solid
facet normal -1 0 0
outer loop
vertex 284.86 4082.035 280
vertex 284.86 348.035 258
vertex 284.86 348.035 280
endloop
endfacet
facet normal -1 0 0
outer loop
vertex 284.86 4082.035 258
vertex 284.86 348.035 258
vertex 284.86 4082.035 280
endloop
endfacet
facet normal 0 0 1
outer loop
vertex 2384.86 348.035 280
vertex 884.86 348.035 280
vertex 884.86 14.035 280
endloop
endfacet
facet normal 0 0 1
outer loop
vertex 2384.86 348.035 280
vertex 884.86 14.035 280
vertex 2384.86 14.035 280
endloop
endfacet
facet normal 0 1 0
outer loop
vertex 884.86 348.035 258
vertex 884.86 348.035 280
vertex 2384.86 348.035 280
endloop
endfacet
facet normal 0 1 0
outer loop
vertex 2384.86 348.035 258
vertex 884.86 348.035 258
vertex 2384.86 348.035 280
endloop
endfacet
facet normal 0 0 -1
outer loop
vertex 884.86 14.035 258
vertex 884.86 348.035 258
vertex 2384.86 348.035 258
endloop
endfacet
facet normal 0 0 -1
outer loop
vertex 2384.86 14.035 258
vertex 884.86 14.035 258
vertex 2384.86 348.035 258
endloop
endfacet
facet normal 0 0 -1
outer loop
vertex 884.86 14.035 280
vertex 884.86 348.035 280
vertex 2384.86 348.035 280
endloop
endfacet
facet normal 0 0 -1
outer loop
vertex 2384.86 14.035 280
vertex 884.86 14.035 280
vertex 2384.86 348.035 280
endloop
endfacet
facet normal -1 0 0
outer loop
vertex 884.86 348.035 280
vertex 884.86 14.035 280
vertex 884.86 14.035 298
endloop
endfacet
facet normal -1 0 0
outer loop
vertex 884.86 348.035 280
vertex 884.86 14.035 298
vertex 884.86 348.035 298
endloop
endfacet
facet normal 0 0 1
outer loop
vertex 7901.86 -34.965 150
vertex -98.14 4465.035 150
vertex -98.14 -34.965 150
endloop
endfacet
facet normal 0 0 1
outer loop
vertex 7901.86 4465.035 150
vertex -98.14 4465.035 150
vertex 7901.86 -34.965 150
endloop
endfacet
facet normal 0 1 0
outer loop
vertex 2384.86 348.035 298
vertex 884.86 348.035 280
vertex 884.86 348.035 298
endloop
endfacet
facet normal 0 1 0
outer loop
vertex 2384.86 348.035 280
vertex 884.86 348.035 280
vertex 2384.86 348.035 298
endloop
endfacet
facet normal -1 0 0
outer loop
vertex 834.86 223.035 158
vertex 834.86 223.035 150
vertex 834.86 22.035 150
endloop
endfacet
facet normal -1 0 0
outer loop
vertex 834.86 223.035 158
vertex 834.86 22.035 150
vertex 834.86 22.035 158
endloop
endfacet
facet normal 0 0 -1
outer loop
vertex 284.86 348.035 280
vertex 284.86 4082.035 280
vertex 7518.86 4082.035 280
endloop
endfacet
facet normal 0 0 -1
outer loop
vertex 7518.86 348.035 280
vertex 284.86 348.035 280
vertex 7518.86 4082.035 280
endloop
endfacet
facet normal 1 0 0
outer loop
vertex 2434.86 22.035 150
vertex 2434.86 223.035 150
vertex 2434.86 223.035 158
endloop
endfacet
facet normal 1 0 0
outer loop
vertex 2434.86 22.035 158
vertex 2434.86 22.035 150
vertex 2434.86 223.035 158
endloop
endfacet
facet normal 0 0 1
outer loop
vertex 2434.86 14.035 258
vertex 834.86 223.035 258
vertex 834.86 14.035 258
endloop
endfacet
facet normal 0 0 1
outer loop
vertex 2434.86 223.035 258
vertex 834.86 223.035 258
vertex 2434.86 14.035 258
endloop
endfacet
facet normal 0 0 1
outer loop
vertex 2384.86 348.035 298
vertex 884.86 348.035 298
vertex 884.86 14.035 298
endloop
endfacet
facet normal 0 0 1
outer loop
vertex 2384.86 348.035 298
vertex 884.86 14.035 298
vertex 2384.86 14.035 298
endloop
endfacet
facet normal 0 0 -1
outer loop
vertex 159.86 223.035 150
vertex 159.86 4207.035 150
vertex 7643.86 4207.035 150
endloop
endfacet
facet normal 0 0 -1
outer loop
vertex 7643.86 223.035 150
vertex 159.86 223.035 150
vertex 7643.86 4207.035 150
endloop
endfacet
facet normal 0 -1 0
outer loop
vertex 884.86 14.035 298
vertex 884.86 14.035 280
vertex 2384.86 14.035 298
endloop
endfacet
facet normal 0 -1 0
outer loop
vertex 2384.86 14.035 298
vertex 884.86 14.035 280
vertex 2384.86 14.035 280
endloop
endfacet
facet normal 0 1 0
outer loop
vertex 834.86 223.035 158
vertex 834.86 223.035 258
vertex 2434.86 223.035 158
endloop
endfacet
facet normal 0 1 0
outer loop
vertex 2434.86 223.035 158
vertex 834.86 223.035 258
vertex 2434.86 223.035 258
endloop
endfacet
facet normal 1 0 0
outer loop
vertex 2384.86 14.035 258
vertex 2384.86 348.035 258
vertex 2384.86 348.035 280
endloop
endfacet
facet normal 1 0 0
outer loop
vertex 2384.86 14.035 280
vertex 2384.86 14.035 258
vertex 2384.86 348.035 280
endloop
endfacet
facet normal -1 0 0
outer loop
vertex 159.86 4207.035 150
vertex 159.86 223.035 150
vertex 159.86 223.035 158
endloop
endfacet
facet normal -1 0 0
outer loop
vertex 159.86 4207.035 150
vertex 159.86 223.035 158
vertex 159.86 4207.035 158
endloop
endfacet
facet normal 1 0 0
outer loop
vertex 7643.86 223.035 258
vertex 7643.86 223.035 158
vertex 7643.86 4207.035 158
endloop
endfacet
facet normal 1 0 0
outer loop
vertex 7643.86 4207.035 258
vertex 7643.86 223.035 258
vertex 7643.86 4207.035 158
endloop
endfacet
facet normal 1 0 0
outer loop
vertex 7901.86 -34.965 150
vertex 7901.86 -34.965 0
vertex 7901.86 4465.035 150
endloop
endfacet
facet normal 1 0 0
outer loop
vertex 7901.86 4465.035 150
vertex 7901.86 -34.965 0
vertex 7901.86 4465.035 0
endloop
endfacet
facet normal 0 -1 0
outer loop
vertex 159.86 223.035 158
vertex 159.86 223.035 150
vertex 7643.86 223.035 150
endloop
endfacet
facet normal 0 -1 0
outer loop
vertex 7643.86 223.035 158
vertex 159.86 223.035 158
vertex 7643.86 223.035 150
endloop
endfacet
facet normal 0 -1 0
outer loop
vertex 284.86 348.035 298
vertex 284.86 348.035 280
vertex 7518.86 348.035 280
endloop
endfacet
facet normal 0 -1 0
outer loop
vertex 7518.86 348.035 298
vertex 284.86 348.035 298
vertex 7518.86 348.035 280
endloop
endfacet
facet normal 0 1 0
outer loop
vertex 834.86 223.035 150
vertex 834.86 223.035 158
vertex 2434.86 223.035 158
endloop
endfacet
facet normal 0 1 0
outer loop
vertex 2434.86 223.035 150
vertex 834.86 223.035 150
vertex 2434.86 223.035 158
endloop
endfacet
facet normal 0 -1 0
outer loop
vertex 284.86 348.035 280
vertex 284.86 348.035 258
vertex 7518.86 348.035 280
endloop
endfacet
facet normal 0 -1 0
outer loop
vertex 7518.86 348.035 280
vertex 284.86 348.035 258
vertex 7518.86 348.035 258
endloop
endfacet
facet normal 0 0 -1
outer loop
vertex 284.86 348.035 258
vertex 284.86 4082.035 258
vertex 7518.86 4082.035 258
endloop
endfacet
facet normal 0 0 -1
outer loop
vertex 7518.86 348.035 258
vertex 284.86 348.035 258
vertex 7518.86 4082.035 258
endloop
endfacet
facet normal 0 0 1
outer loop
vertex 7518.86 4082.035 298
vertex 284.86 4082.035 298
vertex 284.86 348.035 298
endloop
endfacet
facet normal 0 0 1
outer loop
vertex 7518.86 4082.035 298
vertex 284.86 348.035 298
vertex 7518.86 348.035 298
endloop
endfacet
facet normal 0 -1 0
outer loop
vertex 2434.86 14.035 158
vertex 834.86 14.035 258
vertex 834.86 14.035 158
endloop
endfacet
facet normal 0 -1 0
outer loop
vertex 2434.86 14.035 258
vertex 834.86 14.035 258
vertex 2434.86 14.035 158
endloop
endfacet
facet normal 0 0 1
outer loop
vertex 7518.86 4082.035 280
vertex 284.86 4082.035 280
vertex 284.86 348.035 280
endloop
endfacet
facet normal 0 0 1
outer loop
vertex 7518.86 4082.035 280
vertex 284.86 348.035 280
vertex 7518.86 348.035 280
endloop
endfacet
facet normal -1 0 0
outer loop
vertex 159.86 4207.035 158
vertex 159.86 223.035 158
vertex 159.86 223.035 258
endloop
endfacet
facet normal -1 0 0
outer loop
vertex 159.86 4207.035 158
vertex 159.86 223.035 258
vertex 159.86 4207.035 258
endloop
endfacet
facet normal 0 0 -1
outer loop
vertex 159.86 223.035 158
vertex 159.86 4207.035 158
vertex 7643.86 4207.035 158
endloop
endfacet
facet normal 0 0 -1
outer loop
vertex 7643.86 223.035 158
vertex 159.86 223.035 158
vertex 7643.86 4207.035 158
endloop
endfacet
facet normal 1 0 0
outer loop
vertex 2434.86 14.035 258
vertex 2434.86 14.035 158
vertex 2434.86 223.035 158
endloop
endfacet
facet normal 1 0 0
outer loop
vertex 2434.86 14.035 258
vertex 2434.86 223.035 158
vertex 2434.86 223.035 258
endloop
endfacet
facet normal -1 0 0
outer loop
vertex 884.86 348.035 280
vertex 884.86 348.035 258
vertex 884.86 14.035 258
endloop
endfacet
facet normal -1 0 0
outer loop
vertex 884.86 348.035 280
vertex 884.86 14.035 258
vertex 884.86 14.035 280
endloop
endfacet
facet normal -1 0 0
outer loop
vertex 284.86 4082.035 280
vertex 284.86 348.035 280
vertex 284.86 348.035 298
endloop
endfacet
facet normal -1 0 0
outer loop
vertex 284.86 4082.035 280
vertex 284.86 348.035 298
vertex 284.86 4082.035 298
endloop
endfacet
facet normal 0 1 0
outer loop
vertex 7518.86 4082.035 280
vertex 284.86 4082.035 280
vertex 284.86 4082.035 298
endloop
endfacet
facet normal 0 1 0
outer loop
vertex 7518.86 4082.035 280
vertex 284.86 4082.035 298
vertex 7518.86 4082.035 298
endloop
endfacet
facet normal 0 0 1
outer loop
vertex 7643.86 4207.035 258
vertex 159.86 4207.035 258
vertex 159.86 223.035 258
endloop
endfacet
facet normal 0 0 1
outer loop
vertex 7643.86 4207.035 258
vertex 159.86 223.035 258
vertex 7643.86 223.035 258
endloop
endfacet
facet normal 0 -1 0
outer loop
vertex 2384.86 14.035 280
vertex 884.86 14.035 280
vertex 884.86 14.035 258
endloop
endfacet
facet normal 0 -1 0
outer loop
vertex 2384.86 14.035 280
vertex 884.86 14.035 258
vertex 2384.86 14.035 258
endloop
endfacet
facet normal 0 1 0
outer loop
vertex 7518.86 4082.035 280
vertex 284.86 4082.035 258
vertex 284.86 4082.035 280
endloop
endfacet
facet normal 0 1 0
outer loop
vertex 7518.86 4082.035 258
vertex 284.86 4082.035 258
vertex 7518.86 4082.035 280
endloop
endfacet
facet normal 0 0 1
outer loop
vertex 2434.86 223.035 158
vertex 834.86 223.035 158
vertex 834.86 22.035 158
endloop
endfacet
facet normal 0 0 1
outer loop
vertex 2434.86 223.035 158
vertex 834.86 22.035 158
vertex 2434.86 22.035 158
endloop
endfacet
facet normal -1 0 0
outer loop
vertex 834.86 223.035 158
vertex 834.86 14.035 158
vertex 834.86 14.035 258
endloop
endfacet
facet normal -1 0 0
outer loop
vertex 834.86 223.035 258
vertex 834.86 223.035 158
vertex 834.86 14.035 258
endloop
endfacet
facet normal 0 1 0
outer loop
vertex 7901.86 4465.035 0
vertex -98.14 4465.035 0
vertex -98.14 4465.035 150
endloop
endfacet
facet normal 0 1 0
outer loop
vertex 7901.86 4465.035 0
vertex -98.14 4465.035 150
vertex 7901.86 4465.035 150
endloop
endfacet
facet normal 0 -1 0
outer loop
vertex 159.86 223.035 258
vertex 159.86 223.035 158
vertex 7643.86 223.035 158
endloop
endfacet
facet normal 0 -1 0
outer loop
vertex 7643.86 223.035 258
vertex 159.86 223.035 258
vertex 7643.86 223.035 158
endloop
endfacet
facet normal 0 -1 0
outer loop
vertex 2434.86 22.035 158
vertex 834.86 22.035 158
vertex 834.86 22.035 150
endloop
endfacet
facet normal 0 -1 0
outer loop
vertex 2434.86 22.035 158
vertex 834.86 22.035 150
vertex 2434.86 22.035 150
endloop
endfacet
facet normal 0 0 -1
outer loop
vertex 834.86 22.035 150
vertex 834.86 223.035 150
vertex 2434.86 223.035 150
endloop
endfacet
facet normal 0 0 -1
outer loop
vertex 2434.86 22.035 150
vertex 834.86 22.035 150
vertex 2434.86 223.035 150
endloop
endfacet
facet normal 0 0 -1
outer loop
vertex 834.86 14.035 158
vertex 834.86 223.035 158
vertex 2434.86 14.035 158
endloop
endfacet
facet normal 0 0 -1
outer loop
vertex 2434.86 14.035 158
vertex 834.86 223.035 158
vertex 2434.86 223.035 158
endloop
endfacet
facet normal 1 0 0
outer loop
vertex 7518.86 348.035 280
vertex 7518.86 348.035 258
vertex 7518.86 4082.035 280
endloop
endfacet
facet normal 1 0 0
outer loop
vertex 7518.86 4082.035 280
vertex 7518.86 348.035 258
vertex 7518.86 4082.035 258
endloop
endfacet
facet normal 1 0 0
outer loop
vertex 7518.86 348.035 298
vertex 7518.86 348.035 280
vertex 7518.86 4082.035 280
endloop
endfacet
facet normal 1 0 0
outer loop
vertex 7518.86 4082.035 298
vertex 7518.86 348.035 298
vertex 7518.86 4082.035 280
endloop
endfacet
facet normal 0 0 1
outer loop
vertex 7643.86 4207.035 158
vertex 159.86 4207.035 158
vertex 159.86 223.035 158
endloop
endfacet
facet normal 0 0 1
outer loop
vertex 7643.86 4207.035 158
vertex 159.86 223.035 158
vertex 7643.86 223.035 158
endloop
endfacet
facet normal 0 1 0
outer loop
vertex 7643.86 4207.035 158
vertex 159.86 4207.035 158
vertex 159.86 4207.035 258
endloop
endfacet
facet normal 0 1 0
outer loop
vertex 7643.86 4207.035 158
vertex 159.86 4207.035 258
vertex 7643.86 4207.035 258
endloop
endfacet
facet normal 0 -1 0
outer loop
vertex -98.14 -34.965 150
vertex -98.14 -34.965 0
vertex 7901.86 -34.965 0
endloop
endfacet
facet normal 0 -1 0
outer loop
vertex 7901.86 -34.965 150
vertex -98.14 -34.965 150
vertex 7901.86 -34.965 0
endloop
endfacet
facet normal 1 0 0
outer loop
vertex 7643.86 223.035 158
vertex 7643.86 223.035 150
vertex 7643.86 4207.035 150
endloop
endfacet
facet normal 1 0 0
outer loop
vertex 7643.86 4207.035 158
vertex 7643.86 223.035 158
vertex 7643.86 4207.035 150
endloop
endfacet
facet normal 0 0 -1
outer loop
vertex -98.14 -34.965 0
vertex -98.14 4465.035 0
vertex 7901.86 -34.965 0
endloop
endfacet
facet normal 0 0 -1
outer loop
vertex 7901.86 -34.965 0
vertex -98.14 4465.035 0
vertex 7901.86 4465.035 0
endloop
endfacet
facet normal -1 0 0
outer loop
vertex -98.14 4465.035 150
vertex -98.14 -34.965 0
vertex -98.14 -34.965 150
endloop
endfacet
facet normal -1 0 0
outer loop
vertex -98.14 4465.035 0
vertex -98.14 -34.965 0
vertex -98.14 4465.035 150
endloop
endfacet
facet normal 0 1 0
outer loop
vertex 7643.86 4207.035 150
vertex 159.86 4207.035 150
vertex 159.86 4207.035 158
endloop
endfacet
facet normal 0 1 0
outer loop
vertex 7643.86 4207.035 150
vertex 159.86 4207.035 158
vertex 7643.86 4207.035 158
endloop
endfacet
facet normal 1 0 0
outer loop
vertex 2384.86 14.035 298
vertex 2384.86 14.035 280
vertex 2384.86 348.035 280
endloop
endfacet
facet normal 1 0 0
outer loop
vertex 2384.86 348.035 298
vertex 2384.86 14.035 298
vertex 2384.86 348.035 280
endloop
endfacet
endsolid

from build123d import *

# Parameters (mm, degrees)
F0_W      = 8000
F0_H      = 4500
F1_DEPTH  = 150
F2_W      = 7484
F2_H      = 3984
F3_DEPTH  = 8
F4_W      = 1600
F4_H      = 8
F5_DEPTH  = 201
F6_W      = 7484
F6_H      = 3984
F7_DEPTH  = 100
F8_W      = 1600
F8_H      = 100
F9_DEPTH  = 209
F10_W     = 7234
F10_H     = 3734
F11_DEPTH = 22
F12_W     = 1500
F12_H     = 22
F13_DEPTH = 334
F14_W     = 7234
F14_H     = 3734
F15_DEPTH = 18
F16_W     = 1500
F16_H     = 334
F17_DEPTH = 18


with BuildPart() as f1:
    # F0 (on Top) → F1 (new body)
    with BuildSketch(Plane.XY):
        with Locations((3901.859626174, 2215.0347903371)):
            Rectangle(F0_W, F0_H)
    extrude(amount=F1_DEPTH)


with BuildPart() as f3:
    # F2 (on face) → F3 (new body)
    with BuildSketch(Plane.XY.offset(150)):
        with Locations((3901.859626174, 2215.0347903371)):
            Rectangle(F2_W, F2_H)
    extrude(amount=F3_DEPTH)


with BuildPart() as f5:
    # F4 (on face) → F5 (new body)
    with BuildSketch(Plane.XZ.offset(-223.0347903371)):
        with Locations((1634.859626174, 154)):
            Rectangle(F4_W, F4_H)
    extrude(amount=F5_DEPTH)


with BuildPart() as f7:
    # F6 (on face) → F7 (new body)
    with BuildSketch(Plane.XY.offset(158)):
        with Locations((3901.859626174, 2215.0347903371)):
            Rectangle(F6_W, F6_H)
    extrude(amount=F7_DEPTH)


with BuildPart() as f9:
    # F8 (on face) → F9 (new body)
    with BuildSketch(Plane.XZ.offset(-223.0347903371)):
        with Locations((1634.859626174, 208)):
            Rectangle(F8_W, F8_H)
    extrude(amount=F9_DEPTH)


with BuildPart() as f11:
    # F10 (on face) → F11 (new body)
    with BuildSketch(Plane.XY.offset(258)):
        with Locations((3901.859626174, 2215.0347903371)):
            Rectangle(F10_W, F10_H)
    extrude(amount=F11_DEPTH)


with BuildPart() as f13:
    # F12 (on face) → F13 (new body)
    with BuildSketch(Plane.XZ.offset(-348.0347903371)):
        with Locations((1634.859626174, 269)):
            Rectangle(F12_W, F12_H)
    extrude(amount=F13_DEPTH)


with BuildPart() as f15:
    # F14 (on face) → F15 (new body)
    with BuildSketch(Plane.XY.offset(280)):
        with Locations((3901.859626174, 2215.0347903371)):
            Rectangle(F14_W, F14_H)
    extrude(amount=F15_DEPTH)


with BuildPart() as f17:
    # F16 (on face) → F17 (new body)
    with BuildSketch(Plane.XY.offset(280)):
        with Locations((1634.859626174, 181.0347903371)):
            Rectangle(F16_W, F16_H)
    extrude(amount=F17_DEPTH)


solid = Compound([f1.part, f3.part, f5.part, f7.part, f9.part, f11.part, f13.part, f15.part, f17.part])
